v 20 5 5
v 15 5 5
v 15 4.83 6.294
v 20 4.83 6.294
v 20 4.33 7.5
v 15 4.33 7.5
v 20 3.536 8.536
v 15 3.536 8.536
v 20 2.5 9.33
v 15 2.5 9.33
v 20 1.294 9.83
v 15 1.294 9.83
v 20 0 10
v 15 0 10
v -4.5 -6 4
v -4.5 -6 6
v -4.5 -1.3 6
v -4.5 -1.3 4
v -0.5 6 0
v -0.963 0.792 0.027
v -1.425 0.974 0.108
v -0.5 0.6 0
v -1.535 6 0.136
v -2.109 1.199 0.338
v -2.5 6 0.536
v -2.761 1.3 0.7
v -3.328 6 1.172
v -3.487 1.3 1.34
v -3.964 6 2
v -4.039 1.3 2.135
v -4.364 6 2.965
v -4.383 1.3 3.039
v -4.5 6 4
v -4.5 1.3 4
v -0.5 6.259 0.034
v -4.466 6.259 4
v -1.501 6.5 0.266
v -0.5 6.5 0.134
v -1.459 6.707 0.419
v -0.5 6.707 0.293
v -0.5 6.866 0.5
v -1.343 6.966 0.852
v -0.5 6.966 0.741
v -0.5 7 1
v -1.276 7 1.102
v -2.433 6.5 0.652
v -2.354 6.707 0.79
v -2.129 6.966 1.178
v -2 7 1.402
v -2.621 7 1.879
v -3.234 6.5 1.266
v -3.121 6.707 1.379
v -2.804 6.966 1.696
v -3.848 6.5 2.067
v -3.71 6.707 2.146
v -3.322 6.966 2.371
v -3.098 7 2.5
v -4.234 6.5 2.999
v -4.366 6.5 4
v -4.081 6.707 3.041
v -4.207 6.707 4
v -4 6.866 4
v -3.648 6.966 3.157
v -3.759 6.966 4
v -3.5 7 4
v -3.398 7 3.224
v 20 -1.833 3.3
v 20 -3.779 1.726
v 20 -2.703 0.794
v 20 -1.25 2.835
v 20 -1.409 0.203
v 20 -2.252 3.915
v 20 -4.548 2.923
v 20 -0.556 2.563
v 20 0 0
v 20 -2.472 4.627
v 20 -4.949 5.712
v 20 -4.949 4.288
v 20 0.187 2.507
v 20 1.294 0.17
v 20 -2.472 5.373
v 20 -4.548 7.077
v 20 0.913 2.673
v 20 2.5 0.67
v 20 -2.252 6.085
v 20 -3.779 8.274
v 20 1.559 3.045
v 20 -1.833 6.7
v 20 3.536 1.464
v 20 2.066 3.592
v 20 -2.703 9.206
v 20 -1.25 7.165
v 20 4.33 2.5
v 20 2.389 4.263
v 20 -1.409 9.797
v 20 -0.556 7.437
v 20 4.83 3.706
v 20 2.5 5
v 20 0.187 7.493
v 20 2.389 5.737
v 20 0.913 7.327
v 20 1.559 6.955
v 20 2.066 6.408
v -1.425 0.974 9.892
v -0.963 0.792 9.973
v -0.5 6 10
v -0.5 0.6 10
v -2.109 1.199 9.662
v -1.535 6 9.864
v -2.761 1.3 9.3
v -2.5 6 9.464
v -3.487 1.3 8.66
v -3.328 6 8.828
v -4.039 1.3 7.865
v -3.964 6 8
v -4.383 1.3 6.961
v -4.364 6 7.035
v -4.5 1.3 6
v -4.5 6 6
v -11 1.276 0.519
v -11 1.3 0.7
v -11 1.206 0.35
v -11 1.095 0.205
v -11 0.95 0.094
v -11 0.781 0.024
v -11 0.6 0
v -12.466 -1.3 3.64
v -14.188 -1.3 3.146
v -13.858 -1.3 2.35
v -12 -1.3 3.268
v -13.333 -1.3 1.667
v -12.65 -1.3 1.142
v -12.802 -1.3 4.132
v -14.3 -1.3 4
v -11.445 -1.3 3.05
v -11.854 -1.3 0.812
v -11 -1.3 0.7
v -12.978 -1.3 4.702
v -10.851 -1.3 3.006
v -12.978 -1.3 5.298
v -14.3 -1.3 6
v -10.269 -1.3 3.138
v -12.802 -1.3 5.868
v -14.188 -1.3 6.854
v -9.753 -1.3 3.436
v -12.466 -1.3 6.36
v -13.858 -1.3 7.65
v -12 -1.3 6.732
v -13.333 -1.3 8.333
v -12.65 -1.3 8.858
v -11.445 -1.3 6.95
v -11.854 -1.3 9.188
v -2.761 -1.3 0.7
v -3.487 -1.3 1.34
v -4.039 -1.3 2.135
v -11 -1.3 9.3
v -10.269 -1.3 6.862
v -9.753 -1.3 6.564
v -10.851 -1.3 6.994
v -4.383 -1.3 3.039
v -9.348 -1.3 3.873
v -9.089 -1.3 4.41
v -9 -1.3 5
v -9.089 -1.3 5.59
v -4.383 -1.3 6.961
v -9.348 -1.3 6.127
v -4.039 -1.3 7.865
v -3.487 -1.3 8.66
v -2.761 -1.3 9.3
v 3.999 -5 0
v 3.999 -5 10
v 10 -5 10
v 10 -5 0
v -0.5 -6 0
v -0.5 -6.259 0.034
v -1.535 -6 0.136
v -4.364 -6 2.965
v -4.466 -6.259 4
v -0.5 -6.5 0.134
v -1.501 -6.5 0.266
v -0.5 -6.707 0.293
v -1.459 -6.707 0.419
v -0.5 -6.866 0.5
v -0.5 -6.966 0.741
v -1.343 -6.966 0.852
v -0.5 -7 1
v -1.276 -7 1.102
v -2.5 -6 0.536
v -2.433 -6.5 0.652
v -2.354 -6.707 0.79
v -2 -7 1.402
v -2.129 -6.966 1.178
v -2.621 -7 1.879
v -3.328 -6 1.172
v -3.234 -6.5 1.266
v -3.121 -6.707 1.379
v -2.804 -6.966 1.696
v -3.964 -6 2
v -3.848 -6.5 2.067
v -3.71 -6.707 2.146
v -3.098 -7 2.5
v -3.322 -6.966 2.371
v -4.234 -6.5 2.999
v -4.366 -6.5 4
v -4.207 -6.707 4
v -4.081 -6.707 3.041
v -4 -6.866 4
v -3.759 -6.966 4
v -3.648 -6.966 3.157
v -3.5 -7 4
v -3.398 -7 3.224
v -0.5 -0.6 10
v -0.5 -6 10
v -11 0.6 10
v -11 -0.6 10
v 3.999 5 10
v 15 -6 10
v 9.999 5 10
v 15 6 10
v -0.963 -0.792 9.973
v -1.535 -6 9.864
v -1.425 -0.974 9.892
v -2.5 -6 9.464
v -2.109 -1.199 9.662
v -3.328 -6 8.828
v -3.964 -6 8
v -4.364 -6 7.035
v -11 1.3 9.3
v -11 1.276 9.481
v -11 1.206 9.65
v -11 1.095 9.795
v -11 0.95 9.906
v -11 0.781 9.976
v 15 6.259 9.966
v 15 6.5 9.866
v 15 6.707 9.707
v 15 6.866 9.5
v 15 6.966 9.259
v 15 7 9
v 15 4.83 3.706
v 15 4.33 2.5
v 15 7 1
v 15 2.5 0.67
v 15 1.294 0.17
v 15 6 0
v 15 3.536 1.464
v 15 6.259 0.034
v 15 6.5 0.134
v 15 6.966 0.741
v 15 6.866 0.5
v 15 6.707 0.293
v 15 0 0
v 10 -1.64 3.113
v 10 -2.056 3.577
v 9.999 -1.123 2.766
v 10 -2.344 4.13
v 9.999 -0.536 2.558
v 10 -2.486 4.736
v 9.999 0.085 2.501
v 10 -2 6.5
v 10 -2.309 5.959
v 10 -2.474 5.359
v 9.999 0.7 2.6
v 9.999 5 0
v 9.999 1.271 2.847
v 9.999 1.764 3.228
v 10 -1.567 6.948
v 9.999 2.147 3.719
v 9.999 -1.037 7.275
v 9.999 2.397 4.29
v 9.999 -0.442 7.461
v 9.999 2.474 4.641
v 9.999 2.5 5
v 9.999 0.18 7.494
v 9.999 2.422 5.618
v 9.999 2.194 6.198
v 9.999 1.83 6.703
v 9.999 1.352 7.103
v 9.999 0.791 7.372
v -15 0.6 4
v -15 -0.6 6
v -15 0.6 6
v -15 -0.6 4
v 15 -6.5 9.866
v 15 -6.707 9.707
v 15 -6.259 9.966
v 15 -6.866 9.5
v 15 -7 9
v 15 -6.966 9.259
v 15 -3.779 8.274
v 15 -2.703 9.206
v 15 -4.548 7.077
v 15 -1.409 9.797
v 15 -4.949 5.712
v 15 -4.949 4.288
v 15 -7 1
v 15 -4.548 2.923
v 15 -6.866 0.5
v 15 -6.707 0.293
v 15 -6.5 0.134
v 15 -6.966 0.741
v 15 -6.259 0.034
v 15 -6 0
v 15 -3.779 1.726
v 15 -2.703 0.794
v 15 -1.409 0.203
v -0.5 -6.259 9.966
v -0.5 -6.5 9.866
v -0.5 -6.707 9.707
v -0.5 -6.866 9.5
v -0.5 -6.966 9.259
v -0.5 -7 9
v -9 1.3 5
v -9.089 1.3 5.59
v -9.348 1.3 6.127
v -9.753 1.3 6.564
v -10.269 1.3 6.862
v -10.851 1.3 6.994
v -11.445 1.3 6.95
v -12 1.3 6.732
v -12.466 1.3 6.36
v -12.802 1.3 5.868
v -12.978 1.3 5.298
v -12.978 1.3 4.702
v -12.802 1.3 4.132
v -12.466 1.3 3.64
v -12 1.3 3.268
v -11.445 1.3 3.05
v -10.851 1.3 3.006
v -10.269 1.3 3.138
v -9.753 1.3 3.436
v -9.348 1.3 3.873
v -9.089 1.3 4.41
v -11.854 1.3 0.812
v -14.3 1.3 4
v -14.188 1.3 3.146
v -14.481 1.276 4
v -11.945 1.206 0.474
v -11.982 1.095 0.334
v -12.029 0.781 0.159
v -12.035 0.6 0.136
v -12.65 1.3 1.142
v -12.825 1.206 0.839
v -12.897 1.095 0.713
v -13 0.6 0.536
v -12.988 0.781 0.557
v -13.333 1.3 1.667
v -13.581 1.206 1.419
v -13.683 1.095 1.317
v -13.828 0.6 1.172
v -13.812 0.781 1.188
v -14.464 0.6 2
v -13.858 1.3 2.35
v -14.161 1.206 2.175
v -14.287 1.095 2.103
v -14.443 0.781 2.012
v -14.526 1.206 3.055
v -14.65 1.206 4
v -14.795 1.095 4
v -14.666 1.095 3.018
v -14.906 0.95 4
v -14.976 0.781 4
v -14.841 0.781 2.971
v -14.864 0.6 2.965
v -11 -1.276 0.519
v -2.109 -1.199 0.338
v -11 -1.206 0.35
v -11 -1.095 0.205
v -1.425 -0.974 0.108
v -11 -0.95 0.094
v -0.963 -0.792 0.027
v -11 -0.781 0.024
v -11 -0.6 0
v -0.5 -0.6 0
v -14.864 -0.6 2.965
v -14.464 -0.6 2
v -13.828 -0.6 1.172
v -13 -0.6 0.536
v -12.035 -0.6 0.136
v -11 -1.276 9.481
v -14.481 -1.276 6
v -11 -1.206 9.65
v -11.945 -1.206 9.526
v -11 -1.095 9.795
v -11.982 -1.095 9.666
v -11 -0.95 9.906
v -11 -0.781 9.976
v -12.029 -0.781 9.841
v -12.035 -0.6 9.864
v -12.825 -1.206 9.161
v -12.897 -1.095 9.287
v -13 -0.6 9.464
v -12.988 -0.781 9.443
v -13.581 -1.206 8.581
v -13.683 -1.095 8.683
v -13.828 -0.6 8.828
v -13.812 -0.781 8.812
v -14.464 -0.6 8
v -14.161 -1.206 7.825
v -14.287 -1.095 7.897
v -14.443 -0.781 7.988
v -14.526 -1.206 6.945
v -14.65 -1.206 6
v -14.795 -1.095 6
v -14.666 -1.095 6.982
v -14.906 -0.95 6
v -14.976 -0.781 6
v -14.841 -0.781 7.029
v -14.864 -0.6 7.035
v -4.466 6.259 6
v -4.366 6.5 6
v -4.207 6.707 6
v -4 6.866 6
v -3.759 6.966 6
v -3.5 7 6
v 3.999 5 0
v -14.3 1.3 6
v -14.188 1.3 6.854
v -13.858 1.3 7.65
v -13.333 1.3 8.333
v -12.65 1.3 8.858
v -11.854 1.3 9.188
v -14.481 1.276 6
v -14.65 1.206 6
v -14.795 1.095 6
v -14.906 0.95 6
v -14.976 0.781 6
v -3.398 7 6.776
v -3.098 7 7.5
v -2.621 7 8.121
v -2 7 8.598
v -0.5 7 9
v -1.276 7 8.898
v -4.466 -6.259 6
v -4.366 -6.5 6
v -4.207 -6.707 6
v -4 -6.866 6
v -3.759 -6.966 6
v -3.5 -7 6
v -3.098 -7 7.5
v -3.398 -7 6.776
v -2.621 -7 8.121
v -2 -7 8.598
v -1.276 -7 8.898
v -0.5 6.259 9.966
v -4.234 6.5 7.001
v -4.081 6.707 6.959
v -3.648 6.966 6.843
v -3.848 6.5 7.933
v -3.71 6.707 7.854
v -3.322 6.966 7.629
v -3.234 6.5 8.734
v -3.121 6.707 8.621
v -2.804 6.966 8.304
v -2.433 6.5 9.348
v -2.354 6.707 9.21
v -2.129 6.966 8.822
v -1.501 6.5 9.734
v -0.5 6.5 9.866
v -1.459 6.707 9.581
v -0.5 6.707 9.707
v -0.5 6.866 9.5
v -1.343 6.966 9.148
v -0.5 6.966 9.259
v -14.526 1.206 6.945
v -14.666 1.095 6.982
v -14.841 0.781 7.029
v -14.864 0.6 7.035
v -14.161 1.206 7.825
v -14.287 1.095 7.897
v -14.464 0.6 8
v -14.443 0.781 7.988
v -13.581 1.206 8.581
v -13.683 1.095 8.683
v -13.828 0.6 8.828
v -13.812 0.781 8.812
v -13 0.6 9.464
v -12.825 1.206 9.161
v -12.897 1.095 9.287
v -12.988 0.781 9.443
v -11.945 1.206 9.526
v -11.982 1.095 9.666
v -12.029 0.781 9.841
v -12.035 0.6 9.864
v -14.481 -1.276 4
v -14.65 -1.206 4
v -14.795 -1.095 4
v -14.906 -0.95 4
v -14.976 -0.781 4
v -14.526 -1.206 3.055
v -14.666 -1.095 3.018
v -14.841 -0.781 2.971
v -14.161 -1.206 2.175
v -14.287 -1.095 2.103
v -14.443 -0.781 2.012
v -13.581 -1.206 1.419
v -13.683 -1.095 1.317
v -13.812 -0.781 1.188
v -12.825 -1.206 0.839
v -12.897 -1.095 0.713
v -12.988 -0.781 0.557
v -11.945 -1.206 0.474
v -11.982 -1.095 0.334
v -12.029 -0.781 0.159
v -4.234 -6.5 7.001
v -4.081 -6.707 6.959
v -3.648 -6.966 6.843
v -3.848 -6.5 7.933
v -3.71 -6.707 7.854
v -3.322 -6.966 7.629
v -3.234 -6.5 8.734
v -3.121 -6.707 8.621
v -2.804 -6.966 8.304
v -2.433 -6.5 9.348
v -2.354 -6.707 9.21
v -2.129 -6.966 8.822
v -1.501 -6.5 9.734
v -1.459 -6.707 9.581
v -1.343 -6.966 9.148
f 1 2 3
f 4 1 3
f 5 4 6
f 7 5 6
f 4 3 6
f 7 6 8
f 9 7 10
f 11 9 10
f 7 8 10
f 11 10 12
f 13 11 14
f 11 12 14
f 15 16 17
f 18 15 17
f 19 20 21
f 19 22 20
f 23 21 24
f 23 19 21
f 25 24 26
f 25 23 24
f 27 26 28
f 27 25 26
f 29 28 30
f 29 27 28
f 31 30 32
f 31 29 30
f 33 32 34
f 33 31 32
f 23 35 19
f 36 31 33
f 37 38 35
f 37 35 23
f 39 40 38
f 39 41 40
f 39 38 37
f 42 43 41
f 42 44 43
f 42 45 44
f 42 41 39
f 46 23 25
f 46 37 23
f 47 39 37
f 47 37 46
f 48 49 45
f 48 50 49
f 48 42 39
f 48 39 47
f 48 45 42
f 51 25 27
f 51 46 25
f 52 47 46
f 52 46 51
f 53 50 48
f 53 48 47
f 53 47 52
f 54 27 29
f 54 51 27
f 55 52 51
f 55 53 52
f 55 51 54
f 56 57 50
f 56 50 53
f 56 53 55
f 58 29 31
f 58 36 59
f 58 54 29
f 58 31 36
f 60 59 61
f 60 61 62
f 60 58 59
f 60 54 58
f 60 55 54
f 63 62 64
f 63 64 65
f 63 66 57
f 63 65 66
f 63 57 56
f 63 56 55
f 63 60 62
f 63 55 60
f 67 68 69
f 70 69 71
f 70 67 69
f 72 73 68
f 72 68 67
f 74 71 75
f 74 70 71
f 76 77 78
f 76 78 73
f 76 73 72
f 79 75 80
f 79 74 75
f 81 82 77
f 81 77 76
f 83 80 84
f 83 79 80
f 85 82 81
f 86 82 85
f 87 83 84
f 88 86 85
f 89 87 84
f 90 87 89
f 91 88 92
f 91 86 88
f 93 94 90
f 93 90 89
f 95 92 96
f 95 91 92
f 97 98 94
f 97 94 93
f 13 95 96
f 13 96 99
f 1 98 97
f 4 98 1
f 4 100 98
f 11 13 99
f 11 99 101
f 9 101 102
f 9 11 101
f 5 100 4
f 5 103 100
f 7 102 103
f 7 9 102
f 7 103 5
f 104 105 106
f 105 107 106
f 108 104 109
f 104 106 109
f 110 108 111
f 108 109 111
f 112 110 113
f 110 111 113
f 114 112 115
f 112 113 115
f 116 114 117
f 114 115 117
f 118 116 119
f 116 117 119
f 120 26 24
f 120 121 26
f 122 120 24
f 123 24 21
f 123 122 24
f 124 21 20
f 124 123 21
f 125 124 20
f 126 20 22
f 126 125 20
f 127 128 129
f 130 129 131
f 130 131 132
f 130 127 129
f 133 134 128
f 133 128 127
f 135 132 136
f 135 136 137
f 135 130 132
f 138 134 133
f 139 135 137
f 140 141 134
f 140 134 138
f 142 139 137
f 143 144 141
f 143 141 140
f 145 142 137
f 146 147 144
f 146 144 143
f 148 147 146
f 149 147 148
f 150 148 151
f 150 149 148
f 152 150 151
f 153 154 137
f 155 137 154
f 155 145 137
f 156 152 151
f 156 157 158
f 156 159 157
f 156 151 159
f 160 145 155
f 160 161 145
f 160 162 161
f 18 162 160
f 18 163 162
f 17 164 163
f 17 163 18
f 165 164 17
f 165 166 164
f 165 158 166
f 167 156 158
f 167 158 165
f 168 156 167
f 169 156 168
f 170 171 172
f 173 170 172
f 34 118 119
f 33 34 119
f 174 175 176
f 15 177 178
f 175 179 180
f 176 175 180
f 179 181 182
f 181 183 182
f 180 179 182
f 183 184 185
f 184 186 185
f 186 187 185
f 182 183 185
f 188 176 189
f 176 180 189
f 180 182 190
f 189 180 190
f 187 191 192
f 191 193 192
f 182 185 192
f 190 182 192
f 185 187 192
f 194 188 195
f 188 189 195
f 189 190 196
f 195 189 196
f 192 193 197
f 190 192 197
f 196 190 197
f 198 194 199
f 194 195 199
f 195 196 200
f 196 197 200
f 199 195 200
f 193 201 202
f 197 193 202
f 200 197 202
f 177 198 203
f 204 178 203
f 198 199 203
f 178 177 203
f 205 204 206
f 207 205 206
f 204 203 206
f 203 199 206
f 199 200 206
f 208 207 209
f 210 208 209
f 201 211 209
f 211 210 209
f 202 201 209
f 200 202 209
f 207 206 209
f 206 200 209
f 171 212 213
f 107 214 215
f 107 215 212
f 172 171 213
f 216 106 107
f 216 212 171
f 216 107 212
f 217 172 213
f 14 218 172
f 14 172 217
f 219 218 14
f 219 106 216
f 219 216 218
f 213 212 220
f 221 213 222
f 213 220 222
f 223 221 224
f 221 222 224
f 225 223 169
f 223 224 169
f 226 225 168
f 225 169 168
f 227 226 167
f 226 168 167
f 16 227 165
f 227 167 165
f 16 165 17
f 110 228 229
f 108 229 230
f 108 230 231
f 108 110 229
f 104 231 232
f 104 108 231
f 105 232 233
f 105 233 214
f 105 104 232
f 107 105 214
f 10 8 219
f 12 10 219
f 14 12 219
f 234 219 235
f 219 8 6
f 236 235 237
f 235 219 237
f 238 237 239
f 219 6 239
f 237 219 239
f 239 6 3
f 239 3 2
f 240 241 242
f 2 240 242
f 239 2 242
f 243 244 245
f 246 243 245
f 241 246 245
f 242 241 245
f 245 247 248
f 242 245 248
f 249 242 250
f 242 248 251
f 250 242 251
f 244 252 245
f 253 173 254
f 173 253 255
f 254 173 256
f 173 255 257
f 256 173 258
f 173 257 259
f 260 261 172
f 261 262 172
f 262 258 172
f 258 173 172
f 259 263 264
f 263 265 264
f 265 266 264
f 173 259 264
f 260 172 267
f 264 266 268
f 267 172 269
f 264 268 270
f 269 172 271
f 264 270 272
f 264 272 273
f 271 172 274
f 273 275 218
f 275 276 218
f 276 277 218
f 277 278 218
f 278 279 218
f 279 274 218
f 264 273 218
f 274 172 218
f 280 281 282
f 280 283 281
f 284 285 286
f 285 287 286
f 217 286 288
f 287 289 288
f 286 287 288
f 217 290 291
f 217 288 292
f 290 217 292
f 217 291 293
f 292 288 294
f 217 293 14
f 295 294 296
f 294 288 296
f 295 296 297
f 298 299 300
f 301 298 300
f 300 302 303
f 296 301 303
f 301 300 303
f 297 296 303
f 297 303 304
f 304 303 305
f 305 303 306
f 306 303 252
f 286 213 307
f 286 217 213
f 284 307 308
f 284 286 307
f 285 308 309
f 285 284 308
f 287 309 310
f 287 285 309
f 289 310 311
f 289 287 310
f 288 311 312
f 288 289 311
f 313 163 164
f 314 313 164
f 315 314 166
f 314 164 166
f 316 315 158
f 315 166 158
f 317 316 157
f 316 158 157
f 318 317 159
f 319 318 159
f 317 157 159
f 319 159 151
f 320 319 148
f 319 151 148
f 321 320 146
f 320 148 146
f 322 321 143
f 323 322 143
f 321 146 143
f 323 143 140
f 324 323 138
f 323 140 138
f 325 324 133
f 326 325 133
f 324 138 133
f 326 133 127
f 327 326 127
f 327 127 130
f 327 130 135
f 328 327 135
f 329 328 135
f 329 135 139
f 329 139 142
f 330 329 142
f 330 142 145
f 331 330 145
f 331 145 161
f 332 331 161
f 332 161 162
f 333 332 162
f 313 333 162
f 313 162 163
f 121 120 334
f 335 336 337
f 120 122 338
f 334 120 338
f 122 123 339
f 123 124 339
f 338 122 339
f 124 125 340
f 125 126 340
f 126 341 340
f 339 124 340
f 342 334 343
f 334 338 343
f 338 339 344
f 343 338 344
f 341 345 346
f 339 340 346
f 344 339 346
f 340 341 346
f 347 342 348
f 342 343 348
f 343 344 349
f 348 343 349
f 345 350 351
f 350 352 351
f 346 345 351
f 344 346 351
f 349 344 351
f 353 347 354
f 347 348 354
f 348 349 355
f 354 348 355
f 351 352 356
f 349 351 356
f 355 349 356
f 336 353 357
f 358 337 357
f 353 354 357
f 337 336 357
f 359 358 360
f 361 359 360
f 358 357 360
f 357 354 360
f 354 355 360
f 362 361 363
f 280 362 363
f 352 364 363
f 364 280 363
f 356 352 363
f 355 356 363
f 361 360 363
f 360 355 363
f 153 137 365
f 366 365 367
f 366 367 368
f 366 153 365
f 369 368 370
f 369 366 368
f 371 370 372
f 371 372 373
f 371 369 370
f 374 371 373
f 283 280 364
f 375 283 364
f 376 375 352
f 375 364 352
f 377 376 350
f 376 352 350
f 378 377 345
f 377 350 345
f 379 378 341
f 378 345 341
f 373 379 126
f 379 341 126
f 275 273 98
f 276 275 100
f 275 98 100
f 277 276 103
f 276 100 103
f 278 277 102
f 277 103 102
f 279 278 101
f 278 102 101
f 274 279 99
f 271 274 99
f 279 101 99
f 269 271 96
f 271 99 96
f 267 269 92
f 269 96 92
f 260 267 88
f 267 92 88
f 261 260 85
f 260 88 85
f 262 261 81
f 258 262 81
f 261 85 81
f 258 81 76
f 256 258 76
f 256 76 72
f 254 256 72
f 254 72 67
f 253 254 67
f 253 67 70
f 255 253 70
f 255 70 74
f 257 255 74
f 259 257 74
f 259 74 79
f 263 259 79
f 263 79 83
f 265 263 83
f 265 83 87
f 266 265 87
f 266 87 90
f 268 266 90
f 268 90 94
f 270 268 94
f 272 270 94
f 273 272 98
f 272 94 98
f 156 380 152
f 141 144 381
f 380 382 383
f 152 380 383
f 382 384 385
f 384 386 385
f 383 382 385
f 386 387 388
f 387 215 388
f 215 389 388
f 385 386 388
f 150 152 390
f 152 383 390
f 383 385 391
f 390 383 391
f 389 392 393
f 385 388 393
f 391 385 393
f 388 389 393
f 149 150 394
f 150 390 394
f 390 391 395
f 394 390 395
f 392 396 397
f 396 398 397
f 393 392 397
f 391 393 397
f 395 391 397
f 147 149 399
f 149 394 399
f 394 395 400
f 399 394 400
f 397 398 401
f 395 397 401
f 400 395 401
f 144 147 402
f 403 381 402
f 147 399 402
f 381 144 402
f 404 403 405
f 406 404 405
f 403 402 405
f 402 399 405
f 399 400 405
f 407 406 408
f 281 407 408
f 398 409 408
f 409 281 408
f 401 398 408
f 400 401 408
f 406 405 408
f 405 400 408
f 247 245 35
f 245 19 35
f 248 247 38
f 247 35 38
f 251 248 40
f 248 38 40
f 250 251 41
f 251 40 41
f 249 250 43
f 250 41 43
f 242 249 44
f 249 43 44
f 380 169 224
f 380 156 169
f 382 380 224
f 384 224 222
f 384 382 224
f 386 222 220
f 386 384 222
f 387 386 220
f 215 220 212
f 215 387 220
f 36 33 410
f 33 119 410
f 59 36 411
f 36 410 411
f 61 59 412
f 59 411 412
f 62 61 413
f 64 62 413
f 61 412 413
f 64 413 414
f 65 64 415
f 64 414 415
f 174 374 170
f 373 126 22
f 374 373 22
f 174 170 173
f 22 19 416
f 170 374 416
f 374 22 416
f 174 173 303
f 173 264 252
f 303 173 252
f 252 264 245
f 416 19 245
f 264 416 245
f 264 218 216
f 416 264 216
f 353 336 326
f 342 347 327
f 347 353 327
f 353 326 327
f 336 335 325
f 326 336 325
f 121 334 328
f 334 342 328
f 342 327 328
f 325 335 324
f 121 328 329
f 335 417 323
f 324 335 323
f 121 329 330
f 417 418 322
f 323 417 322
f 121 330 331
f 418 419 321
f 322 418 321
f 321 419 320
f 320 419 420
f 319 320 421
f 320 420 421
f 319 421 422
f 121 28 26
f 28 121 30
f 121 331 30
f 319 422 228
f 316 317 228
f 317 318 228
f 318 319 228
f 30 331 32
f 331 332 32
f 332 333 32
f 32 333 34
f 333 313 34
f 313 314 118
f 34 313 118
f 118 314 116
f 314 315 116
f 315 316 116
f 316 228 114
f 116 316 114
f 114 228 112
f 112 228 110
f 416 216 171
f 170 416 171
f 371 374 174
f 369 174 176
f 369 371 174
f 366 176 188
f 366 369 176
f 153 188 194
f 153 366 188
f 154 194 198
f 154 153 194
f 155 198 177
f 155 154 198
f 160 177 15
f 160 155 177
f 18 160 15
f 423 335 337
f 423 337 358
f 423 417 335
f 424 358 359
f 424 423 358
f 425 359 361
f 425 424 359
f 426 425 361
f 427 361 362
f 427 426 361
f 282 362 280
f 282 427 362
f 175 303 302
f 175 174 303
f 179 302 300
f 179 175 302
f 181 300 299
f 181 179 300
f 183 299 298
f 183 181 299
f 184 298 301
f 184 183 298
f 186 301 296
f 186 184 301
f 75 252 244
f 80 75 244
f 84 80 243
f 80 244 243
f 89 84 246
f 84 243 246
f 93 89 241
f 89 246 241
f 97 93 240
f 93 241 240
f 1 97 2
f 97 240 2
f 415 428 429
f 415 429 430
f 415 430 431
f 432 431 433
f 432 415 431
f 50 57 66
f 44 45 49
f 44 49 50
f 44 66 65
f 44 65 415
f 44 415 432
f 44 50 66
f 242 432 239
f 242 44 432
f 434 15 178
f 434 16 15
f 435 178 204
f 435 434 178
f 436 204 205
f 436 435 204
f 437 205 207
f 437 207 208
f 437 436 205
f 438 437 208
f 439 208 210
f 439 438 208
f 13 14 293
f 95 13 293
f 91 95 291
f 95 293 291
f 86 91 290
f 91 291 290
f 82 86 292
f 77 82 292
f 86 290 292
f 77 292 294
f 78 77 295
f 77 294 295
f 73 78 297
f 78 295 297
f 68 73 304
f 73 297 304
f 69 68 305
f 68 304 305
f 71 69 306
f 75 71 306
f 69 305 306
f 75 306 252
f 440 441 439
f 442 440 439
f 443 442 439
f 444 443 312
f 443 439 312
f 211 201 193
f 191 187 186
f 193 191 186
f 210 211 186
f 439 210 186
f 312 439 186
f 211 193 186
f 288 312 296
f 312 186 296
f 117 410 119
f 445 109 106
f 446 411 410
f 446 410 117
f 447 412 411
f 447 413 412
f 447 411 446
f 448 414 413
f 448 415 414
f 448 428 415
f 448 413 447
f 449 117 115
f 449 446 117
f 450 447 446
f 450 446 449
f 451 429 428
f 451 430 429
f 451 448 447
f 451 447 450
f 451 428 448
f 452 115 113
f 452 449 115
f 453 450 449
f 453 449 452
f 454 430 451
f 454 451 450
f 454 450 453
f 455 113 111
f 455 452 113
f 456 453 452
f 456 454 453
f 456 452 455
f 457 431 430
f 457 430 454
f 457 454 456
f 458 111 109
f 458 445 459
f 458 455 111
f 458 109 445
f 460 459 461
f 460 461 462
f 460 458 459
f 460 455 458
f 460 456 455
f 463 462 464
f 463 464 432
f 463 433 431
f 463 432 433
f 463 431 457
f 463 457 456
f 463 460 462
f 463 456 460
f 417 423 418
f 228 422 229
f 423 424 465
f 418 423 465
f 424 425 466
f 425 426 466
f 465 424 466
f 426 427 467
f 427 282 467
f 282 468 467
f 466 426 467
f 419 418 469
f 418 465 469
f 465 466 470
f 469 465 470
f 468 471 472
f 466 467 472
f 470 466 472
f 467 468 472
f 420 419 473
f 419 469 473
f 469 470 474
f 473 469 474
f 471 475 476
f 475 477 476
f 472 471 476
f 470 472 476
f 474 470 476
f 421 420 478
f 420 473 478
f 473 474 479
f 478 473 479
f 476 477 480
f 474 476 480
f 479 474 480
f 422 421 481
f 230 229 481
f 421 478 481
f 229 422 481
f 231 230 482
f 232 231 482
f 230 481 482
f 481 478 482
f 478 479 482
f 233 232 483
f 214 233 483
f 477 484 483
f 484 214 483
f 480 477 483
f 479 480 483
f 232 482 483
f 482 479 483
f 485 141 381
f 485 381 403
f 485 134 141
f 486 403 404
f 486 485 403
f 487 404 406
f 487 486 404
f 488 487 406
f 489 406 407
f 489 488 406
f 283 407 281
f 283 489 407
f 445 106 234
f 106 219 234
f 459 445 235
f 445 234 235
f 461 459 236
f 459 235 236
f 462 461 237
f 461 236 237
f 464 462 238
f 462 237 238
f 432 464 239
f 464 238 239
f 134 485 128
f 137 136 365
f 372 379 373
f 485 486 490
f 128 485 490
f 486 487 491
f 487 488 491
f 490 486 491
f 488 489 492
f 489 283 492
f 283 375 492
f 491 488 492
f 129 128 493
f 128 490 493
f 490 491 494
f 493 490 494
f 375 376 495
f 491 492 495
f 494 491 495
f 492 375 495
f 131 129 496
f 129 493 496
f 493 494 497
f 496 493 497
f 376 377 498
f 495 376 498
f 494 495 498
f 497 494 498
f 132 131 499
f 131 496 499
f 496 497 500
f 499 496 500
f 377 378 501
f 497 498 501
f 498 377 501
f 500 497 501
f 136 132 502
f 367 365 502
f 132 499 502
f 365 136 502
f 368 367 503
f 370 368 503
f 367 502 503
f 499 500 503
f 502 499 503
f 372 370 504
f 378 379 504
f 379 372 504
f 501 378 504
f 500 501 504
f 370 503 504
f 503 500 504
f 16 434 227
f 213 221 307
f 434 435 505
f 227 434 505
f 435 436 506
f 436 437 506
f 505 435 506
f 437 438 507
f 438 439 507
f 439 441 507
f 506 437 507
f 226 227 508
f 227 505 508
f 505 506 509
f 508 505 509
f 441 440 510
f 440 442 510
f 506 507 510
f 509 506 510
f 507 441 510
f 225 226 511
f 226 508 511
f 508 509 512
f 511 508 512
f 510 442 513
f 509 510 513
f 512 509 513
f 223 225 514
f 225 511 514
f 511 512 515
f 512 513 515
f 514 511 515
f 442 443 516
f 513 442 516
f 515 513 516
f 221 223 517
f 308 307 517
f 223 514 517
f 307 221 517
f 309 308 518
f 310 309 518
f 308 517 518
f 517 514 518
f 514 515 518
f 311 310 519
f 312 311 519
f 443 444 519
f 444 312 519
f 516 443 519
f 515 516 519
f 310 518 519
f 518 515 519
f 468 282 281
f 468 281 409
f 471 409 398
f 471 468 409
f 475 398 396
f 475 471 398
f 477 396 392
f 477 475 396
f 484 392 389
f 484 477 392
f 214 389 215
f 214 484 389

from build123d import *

# Parameters (mm, degrees)
F0_W      = 30
F0_H      = 14
F1_DEPTH  = 10
F2_W      = 10.5
F2_H      = 5.7
F3_DEPTH  = 25
F4_R      = 4
F5_R      = 2
F6_DEPTH  = 25
F8_DEPTH  = 5
F10_DEPTH = 12
F11_R     = 0.7
F12_R     = 1
F13_R     = 2.5
F14_DEPTH = 15


with BuildPart() as f1:
    # F0 (on Top) → F1 (new body)
    with BuildSketch(Plane.XY):
        Rectangle(F0_W, F0_H)
    extrude(amount=F1_DEPTH)

    # F2 (on face) → F3 (cut)
    with BuildSketch(Plane.XY.offset(10)):
        with Locations((-9.75, -4.15)):
            Rectangle(F2_W, F2_H)
        with Locations((-9.75, 4.15)):
            Rectangle(F2_W, F2_H)
    extrude(amount=-F3_DEPTH, mode=Mode.SUBTRACT)

    # F4
    f4_edges = [f1.edges().sort_by_distance(p)[0] for p in [
        (-15, 0, 10),
        (-15, 0, 0),
        (-4.5, -4.15, 10),
        (-4.5, -4.15, 0),
        (-4.5, 4.15, 0),
        (-4.5, 4.15, 10),
    ]]
    fillet(f4_edges, radius=F4_R)

    # F5 (on face) → F6 (cut)
    with BuildSketch(Plane.XZ.offset(1.3)):
        with Locations((-11, 5)):
            Circle(F5_R)
    extrude(amount=-F6_DEPTH, mode=Mode.SUBTRACT)

    # F7 (on face) → F8 (join)
    with BuildSketch(Plane.YZ.offset(15)):
        with BuildLine():
            ThreePointArc((0, 0), (3.5355339059, 1.4644660941), (5, 5))
            ThreePointArc((5, 5), (3.5355339059, 8.5355339059), (0, 10))
            ThreePointArc((0, 10), (-5, 5), (0, 0))
        make_face()
    extrude(amount=F8_DEPTH)

    # F9 (on face) → F10 (cut)
    with BuildSketch(Plane.XY.offset(10)):
        Polygon((10, -5), (9.9985566437, 5), (3.9985566437, 5), (3.9985566437, -5), align=None)
    extrude(amount=-F10_DEPTH, mode=Mode.SUBTRACT)

    # F11
    f11_edges = [f1.edges().sort_by_distance(p)[0] for p in [
        (-5.75, -1.3, 10),
        (-5.75, -1.3, 0),
        (-13.828427, -1.3, 1.171573),
        (-15, -1.3, 5),
        (-13.828427, -1.3, 8.828427),
        (-5.75, 1.3, 0),
        (-13.828427, 1.3, 1.171573),
        (-15, 1.3, 5),
        (-13.828427, 1.3, 8.828427),
        (-5.75, 1.3, 10),
    ]]
    fillet(f11_edges, radius=F11_R)

    # F12
    f12_edges = [f1.edges().sort_by_distance(p)[0] for p in [
        (7.25, -7, 10),
        (-3.328427, -7, 1.171573),
        (-4.5, -7, 5),
        (-3.328427, -7, 8.828427),
        (7.25, 7, 10),
    ]]
    fillet(f12_edges, radius=F12_R)

    # F13 (on face) → F14 (cut)
    with BuildSketch(Plane.YZ.offset(20)):
        with Locations((0, 5)):
            Circle(F13_R)
    extrude(amount=-F14_DEPTH, mode=Mode.SUBTRACT)


solid = f1.part
